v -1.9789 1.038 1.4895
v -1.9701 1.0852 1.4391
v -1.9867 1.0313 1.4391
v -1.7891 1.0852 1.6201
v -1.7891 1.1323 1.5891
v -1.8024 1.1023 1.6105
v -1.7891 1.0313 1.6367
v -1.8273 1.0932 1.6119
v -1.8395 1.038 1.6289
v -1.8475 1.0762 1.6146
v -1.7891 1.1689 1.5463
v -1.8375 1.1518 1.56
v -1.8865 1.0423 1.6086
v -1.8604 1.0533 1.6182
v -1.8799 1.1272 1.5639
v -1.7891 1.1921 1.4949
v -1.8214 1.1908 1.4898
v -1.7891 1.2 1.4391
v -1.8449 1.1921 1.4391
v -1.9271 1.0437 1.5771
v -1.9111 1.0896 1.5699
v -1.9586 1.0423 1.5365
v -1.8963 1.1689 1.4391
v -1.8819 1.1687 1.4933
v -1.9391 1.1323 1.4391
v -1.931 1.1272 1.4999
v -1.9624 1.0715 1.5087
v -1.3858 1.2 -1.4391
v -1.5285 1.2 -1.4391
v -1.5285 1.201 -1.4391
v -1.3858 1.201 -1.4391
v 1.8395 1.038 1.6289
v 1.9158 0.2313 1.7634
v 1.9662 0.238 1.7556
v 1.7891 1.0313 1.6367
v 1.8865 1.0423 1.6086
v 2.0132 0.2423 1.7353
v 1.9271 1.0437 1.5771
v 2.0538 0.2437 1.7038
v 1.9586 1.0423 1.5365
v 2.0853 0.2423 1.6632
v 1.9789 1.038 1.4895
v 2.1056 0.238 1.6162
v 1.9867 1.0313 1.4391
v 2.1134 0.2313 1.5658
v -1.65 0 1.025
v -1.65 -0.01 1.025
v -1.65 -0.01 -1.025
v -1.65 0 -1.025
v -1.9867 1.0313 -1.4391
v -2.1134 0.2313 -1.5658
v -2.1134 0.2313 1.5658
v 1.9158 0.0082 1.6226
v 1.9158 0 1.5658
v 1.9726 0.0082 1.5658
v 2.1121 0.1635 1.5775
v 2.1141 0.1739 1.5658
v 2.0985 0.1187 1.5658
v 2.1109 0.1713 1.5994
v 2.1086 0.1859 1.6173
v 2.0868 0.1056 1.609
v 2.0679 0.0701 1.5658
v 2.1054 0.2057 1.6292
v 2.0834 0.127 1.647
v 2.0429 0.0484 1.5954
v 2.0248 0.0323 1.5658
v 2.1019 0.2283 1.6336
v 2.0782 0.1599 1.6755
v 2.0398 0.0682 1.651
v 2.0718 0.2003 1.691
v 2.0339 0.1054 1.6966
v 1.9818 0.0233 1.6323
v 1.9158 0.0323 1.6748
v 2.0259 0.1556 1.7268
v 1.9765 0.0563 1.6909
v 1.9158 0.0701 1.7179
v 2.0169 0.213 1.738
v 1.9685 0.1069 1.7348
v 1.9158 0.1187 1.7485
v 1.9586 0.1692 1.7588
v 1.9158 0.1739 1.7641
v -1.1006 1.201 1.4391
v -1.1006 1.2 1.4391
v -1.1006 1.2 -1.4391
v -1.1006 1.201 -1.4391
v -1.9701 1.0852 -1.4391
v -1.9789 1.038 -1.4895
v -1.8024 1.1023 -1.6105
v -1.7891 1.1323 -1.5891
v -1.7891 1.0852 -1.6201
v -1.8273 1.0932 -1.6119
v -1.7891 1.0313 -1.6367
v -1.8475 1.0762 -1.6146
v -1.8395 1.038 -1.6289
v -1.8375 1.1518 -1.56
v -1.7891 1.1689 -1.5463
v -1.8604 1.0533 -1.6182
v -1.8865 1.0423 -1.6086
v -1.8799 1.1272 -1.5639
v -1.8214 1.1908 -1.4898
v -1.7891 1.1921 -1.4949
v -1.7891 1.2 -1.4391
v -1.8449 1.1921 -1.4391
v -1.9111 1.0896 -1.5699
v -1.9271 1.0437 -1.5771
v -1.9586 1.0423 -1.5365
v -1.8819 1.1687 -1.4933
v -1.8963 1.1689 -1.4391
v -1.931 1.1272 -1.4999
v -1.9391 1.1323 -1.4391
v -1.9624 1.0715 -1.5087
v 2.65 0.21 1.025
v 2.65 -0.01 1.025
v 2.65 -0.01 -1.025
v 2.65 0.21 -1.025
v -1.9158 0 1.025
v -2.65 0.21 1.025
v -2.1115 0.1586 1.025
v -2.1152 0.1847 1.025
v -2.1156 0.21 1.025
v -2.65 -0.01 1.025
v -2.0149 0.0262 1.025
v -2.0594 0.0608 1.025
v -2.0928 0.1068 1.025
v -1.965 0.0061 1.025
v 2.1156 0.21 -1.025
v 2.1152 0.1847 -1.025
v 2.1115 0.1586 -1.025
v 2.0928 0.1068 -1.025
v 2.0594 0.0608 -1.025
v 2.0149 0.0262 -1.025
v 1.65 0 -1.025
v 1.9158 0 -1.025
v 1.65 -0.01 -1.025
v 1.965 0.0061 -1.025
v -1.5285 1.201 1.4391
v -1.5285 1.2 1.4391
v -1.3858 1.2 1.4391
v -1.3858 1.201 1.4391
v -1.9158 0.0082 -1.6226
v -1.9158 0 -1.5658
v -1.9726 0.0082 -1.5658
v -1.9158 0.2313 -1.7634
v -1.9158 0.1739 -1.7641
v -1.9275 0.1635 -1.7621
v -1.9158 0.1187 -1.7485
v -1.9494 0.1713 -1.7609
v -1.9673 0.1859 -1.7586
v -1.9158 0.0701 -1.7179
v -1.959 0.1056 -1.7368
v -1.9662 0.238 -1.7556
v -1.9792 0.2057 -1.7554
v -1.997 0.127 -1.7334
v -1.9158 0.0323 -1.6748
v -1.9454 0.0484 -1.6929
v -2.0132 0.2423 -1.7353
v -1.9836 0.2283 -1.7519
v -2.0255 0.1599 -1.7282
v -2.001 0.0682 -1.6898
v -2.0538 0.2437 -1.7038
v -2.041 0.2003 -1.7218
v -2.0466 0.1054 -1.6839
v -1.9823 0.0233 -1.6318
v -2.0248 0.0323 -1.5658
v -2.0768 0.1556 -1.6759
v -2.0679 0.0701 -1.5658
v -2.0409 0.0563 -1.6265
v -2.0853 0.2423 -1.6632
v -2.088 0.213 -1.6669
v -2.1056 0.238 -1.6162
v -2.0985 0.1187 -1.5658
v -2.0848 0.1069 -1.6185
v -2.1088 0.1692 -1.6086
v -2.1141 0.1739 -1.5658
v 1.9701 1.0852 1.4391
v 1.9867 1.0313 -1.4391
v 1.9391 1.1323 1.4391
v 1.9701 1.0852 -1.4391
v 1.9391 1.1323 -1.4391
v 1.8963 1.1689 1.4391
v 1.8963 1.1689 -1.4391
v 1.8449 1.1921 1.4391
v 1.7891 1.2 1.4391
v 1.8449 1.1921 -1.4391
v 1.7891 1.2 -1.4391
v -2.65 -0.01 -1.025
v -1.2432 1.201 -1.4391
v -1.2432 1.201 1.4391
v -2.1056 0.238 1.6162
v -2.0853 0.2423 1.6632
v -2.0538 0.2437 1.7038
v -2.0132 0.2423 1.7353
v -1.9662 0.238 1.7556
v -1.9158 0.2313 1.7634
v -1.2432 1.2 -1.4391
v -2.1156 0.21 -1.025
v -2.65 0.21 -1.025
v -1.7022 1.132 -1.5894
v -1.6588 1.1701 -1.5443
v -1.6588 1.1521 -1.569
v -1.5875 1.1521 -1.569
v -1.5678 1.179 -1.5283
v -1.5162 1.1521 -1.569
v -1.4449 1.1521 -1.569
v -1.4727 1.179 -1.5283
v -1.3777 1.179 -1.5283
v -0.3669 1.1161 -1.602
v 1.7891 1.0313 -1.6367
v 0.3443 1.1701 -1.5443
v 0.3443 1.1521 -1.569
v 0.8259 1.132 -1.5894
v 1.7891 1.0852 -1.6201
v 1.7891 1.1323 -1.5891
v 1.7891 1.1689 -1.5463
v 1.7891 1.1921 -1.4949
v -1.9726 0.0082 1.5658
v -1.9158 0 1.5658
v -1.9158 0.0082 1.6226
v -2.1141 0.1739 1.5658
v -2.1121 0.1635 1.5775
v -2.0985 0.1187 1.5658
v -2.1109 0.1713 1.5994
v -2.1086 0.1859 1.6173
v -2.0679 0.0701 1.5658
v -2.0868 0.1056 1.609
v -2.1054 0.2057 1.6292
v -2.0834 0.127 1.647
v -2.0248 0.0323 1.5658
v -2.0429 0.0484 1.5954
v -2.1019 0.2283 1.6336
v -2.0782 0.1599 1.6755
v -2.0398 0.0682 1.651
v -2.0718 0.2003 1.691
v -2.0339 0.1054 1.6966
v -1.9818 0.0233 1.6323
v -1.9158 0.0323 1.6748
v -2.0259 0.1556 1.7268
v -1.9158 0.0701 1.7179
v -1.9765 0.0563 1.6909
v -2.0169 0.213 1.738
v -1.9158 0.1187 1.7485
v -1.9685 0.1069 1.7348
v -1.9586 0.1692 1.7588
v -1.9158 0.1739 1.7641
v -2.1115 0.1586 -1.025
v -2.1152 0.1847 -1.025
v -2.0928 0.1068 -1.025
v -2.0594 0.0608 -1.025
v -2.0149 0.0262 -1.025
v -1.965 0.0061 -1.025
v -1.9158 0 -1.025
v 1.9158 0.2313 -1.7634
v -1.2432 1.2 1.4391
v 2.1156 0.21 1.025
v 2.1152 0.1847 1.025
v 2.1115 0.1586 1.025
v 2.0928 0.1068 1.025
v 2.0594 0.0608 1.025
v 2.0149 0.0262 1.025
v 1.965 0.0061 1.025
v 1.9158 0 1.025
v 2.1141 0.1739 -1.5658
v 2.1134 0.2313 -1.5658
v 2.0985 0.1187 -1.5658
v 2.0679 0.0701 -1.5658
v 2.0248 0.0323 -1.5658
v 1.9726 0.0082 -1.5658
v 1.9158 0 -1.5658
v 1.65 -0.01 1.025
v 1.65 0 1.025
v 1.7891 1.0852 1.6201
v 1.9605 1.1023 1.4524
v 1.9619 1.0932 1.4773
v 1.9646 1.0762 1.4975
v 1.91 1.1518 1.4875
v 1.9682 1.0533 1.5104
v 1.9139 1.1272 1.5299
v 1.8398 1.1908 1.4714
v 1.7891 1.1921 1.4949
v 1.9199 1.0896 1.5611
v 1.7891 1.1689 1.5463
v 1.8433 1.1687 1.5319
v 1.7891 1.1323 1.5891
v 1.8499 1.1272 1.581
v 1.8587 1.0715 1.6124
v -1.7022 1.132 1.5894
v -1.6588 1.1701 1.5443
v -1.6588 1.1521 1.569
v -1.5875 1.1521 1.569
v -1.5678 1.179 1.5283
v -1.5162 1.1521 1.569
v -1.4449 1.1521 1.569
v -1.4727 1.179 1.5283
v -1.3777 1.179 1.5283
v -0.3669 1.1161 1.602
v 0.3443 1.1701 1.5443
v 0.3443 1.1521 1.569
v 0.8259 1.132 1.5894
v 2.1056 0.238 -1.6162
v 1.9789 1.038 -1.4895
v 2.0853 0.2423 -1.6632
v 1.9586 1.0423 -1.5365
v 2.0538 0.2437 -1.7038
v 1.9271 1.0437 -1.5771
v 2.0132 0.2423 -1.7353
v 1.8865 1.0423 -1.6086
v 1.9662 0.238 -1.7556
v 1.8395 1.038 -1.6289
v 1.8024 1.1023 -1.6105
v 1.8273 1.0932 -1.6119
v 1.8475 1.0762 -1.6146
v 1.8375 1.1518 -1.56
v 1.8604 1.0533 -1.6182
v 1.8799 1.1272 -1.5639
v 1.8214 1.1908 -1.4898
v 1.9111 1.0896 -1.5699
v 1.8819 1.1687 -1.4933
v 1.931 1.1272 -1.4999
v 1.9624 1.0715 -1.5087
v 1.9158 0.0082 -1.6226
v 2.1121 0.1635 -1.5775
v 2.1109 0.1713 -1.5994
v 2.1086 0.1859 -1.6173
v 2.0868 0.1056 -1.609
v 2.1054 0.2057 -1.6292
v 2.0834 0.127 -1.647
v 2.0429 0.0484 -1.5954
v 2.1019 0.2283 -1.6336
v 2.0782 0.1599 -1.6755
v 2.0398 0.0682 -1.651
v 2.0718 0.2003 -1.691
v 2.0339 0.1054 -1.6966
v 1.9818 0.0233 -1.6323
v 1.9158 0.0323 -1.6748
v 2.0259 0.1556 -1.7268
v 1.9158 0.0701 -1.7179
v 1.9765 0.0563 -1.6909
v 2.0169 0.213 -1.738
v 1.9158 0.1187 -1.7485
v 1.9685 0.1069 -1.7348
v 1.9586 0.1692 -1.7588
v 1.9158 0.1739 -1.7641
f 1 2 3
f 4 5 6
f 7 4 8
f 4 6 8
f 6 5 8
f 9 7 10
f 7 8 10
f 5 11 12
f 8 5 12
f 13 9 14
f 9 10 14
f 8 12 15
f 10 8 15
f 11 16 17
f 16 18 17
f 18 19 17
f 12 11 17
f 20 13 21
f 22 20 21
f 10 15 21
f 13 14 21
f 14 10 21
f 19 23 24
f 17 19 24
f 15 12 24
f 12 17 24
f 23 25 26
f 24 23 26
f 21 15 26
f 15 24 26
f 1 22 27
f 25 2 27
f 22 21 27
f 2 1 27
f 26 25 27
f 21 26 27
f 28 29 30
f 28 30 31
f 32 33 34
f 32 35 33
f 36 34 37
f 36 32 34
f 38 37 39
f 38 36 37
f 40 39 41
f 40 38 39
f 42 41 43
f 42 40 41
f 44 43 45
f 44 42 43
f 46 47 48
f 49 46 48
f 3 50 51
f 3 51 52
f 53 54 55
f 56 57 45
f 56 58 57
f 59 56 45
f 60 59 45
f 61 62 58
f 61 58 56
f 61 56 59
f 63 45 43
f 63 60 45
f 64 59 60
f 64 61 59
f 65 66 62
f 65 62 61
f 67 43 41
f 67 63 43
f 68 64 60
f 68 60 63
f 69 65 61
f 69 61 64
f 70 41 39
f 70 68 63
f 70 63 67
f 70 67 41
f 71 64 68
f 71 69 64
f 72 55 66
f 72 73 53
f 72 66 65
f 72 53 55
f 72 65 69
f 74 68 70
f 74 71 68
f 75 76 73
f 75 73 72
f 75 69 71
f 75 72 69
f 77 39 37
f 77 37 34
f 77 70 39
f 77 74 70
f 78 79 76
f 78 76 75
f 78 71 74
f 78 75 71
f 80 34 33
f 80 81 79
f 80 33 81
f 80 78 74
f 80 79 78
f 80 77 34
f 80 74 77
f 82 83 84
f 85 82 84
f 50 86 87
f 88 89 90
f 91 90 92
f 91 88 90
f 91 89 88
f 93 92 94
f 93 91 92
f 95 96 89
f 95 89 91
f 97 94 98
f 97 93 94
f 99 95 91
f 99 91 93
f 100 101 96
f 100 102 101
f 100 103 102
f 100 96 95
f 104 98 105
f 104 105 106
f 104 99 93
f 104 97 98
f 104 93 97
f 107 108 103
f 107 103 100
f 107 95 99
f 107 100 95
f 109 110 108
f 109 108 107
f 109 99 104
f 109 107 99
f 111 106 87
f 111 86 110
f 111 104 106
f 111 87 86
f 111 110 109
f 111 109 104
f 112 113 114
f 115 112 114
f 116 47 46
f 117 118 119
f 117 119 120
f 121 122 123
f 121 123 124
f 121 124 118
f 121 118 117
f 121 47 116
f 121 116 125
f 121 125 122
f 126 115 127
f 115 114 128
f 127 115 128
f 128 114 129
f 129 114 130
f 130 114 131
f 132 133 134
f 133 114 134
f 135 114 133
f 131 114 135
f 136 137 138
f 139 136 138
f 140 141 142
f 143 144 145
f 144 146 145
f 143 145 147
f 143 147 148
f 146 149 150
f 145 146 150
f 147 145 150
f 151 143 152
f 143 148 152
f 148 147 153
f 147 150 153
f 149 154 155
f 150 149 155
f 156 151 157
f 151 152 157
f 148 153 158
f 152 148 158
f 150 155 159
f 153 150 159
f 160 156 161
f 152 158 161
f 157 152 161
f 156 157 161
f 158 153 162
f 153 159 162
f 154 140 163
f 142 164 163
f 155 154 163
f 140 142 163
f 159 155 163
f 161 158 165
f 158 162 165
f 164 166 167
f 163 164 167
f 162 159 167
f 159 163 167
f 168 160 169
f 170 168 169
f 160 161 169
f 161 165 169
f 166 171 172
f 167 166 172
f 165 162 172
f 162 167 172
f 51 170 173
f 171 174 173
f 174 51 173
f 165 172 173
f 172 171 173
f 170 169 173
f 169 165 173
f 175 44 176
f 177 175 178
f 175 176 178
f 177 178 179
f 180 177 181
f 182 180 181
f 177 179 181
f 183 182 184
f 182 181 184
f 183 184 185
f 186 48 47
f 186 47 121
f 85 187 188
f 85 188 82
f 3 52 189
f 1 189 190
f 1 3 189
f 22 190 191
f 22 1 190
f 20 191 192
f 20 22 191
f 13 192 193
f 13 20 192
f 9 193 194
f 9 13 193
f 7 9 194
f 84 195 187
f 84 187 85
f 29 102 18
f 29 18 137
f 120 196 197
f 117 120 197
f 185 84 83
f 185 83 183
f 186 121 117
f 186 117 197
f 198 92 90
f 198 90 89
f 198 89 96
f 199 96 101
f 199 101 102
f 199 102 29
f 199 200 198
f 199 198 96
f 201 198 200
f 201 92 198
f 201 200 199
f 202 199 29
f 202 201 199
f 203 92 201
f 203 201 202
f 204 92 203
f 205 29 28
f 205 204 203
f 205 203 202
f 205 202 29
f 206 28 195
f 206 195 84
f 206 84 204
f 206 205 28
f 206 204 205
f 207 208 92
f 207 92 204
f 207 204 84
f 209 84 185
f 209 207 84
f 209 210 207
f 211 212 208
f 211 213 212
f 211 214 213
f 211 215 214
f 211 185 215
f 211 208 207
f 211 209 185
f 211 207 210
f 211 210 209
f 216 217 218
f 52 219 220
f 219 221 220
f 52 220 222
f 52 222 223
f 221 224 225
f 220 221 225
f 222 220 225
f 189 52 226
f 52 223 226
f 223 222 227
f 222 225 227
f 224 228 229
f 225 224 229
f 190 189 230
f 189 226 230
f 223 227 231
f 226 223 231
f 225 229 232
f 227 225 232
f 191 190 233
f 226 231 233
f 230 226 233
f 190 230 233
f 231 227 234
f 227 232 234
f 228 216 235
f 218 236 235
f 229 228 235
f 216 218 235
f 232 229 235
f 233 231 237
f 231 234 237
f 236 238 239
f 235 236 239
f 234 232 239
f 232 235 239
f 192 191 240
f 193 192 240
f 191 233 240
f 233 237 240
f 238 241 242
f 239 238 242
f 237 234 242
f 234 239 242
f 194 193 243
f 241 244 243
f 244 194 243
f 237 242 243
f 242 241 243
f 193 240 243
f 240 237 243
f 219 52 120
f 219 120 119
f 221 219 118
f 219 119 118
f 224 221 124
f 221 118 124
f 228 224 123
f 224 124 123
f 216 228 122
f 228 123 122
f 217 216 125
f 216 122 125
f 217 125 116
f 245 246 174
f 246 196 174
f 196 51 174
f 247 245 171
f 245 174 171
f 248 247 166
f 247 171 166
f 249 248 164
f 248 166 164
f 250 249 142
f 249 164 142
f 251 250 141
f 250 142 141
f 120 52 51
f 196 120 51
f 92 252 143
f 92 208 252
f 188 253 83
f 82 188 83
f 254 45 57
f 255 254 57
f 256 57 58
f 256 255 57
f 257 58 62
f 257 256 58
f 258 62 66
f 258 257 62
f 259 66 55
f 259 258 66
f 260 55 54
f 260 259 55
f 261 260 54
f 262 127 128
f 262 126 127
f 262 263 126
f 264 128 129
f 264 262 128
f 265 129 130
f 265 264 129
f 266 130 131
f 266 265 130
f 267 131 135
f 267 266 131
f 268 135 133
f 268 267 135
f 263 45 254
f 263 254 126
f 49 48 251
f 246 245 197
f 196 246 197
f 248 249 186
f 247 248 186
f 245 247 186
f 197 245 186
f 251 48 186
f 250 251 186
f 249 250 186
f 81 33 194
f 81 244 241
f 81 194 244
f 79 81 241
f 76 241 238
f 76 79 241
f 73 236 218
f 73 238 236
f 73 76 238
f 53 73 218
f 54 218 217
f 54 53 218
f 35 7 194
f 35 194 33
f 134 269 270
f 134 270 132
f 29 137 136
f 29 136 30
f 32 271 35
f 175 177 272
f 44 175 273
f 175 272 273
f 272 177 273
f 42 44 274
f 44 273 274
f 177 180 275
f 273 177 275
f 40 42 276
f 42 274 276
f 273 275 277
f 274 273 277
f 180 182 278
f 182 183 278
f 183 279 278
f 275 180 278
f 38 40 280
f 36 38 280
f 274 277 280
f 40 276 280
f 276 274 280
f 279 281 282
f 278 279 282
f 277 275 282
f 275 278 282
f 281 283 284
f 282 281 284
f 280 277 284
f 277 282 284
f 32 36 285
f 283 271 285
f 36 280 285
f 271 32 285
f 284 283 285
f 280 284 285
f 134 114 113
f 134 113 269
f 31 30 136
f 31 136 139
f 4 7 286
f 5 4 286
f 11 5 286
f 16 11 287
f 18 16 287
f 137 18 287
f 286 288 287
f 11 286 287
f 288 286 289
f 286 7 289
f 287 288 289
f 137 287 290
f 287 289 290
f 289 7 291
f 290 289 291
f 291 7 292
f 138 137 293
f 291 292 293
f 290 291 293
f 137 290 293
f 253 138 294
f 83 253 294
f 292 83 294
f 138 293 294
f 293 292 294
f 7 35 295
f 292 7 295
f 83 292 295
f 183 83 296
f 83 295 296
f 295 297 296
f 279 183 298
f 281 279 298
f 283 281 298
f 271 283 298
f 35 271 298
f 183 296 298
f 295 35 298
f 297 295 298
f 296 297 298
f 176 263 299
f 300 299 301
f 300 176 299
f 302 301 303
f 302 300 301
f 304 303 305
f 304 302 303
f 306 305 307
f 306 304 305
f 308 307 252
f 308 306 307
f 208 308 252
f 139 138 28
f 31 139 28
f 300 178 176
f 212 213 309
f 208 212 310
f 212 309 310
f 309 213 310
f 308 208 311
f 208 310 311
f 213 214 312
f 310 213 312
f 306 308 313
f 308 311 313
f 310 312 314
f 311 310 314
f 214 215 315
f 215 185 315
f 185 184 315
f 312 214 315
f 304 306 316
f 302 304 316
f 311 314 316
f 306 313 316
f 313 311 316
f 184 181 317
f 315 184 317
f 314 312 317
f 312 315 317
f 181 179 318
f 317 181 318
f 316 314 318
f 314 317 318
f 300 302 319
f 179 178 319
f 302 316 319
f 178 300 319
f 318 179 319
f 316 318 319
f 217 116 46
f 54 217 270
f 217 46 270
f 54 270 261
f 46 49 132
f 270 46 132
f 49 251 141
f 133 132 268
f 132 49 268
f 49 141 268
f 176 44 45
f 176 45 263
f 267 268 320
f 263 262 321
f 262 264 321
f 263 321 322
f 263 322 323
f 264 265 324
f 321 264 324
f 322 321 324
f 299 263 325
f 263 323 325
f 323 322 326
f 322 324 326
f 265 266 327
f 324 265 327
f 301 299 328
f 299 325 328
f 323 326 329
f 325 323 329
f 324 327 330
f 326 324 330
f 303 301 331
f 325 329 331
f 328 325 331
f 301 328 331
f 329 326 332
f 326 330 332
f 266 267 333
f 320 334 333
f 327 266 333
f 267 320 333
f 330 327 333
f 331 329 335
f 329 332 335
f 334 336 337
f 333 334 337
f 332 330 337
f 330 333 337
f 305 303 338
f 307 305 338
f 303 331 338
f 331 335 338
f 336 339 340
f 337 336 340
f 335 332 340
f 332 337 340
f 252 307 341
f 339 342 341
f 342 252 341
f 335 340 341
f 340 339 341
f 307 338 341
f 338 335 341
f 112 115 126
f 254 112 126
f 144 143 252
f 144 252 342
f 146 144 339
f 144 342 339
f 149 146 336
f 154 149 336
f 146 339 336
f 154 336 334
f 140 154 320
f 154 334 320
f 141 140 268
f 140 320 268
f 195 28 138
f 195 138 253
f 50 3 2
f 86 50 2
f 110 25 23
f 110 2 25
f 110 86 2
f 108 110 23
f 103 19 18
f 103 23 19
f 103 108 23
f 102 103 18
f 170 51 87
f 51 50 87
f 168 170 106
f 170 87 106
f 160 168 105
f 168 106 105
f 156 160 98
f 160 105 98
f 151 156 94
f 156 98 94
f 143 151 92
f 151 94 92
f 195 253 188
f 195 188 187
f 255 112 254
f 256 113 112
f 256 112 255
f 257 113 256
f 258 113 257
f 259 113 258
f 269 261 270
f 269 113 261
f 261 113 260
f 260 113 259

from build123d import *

# Parameters (mm, degrees)
SKETCH1_W           = 4.3
SKETCH1_H           = 3.6
BOSS_EXTRUDE1_DEPTH = 1.2
BOSS_EXTRUDE1_TAPER = 9
FILLET1_R           = 0.2
SKETCH3_W           = 1
SKETCH3_H           = 2.05
BOSS_EXTRUDE2_DEPTH = 0.22
SKETCH4_W           = 0.142609486
SKETCH4_H           = 2.87824507
SKETCH4_W_2         = 0.142609485
BOSS_EXTRUDE3_DEPTH = 0.001


with BuildPart() as part:
    # Sketch1 → Boss-Extrude1 (new body)
    with BuildSketch(Plane(origin=(0, 0, 0), x_dir=(1, 0, 0), z_dir=(0, 1, 0))):
        Rectangle(SKETCH1_W, SKETCH1_H)
    extrude(amount=BOSS_EXTRUDE1_DEPTH, taper=BOSS_EXTRUDE1_TAPER)

    # Fillet1
    fillet1_edges = [part.edges().sort_by_distance(p)[0] for p in [
        (-1.959938672, 1.2, 0),
        (0, 1.2, 1.609938672),
        (1.959938672, 1.2, 0),
        (0, 0, 1.8),
        (-2.15, 0, 0),
        (0, 0, -1.8),
        (2.15, 0, 0),
        (0, 1.2, -1.609938672),
        (2.054969336, 0.6, 1.704969336),
        (-2.054969336, 0.6, 1.704969336),
        (-2.054969336, 0.6, -1.704969336),
        (2.054969336, 0.6, -1.704969336),
    ]]
    fillet(fillet1_edges, radius=FILLET1_R)

    # Sketch3 → Boss-Extrude2 (add)
    with BuildSketch(Plane(origin=(0, -0.01, 0), x_dir=(-1, 0, 0), z_dir=(0, -1, 0))):
        with Locations((2.15, 0)):
            Rectangle(SKETCH3_W, SKETCH3_H)
        with Locations((-2.15, 0)):
            Rectangle(SKETCH3_W, SKETCH3_H)
    extrude(amount=-BOSS_EXTRUDE2_DEPTH)

    # Sketch4 → Boss-Extrude3 (add)
    with BuildSketch(Plane(origin=(0, 1.2, 0), x_dir=(1, 0, 0), z_dir=(0, 1, 0))):
        with Locations((-1.457146389, 0)):
            Rectangle(SKETCH4_W, SKETCH4_H)
        with Locations((-1.171927419, 0)):
            Rectangle(SKETCH4_W_2, SKETCH4_H)
    extrude(amount=BOSS_EXTRUDE3_DEPTH)


solid = part.part
